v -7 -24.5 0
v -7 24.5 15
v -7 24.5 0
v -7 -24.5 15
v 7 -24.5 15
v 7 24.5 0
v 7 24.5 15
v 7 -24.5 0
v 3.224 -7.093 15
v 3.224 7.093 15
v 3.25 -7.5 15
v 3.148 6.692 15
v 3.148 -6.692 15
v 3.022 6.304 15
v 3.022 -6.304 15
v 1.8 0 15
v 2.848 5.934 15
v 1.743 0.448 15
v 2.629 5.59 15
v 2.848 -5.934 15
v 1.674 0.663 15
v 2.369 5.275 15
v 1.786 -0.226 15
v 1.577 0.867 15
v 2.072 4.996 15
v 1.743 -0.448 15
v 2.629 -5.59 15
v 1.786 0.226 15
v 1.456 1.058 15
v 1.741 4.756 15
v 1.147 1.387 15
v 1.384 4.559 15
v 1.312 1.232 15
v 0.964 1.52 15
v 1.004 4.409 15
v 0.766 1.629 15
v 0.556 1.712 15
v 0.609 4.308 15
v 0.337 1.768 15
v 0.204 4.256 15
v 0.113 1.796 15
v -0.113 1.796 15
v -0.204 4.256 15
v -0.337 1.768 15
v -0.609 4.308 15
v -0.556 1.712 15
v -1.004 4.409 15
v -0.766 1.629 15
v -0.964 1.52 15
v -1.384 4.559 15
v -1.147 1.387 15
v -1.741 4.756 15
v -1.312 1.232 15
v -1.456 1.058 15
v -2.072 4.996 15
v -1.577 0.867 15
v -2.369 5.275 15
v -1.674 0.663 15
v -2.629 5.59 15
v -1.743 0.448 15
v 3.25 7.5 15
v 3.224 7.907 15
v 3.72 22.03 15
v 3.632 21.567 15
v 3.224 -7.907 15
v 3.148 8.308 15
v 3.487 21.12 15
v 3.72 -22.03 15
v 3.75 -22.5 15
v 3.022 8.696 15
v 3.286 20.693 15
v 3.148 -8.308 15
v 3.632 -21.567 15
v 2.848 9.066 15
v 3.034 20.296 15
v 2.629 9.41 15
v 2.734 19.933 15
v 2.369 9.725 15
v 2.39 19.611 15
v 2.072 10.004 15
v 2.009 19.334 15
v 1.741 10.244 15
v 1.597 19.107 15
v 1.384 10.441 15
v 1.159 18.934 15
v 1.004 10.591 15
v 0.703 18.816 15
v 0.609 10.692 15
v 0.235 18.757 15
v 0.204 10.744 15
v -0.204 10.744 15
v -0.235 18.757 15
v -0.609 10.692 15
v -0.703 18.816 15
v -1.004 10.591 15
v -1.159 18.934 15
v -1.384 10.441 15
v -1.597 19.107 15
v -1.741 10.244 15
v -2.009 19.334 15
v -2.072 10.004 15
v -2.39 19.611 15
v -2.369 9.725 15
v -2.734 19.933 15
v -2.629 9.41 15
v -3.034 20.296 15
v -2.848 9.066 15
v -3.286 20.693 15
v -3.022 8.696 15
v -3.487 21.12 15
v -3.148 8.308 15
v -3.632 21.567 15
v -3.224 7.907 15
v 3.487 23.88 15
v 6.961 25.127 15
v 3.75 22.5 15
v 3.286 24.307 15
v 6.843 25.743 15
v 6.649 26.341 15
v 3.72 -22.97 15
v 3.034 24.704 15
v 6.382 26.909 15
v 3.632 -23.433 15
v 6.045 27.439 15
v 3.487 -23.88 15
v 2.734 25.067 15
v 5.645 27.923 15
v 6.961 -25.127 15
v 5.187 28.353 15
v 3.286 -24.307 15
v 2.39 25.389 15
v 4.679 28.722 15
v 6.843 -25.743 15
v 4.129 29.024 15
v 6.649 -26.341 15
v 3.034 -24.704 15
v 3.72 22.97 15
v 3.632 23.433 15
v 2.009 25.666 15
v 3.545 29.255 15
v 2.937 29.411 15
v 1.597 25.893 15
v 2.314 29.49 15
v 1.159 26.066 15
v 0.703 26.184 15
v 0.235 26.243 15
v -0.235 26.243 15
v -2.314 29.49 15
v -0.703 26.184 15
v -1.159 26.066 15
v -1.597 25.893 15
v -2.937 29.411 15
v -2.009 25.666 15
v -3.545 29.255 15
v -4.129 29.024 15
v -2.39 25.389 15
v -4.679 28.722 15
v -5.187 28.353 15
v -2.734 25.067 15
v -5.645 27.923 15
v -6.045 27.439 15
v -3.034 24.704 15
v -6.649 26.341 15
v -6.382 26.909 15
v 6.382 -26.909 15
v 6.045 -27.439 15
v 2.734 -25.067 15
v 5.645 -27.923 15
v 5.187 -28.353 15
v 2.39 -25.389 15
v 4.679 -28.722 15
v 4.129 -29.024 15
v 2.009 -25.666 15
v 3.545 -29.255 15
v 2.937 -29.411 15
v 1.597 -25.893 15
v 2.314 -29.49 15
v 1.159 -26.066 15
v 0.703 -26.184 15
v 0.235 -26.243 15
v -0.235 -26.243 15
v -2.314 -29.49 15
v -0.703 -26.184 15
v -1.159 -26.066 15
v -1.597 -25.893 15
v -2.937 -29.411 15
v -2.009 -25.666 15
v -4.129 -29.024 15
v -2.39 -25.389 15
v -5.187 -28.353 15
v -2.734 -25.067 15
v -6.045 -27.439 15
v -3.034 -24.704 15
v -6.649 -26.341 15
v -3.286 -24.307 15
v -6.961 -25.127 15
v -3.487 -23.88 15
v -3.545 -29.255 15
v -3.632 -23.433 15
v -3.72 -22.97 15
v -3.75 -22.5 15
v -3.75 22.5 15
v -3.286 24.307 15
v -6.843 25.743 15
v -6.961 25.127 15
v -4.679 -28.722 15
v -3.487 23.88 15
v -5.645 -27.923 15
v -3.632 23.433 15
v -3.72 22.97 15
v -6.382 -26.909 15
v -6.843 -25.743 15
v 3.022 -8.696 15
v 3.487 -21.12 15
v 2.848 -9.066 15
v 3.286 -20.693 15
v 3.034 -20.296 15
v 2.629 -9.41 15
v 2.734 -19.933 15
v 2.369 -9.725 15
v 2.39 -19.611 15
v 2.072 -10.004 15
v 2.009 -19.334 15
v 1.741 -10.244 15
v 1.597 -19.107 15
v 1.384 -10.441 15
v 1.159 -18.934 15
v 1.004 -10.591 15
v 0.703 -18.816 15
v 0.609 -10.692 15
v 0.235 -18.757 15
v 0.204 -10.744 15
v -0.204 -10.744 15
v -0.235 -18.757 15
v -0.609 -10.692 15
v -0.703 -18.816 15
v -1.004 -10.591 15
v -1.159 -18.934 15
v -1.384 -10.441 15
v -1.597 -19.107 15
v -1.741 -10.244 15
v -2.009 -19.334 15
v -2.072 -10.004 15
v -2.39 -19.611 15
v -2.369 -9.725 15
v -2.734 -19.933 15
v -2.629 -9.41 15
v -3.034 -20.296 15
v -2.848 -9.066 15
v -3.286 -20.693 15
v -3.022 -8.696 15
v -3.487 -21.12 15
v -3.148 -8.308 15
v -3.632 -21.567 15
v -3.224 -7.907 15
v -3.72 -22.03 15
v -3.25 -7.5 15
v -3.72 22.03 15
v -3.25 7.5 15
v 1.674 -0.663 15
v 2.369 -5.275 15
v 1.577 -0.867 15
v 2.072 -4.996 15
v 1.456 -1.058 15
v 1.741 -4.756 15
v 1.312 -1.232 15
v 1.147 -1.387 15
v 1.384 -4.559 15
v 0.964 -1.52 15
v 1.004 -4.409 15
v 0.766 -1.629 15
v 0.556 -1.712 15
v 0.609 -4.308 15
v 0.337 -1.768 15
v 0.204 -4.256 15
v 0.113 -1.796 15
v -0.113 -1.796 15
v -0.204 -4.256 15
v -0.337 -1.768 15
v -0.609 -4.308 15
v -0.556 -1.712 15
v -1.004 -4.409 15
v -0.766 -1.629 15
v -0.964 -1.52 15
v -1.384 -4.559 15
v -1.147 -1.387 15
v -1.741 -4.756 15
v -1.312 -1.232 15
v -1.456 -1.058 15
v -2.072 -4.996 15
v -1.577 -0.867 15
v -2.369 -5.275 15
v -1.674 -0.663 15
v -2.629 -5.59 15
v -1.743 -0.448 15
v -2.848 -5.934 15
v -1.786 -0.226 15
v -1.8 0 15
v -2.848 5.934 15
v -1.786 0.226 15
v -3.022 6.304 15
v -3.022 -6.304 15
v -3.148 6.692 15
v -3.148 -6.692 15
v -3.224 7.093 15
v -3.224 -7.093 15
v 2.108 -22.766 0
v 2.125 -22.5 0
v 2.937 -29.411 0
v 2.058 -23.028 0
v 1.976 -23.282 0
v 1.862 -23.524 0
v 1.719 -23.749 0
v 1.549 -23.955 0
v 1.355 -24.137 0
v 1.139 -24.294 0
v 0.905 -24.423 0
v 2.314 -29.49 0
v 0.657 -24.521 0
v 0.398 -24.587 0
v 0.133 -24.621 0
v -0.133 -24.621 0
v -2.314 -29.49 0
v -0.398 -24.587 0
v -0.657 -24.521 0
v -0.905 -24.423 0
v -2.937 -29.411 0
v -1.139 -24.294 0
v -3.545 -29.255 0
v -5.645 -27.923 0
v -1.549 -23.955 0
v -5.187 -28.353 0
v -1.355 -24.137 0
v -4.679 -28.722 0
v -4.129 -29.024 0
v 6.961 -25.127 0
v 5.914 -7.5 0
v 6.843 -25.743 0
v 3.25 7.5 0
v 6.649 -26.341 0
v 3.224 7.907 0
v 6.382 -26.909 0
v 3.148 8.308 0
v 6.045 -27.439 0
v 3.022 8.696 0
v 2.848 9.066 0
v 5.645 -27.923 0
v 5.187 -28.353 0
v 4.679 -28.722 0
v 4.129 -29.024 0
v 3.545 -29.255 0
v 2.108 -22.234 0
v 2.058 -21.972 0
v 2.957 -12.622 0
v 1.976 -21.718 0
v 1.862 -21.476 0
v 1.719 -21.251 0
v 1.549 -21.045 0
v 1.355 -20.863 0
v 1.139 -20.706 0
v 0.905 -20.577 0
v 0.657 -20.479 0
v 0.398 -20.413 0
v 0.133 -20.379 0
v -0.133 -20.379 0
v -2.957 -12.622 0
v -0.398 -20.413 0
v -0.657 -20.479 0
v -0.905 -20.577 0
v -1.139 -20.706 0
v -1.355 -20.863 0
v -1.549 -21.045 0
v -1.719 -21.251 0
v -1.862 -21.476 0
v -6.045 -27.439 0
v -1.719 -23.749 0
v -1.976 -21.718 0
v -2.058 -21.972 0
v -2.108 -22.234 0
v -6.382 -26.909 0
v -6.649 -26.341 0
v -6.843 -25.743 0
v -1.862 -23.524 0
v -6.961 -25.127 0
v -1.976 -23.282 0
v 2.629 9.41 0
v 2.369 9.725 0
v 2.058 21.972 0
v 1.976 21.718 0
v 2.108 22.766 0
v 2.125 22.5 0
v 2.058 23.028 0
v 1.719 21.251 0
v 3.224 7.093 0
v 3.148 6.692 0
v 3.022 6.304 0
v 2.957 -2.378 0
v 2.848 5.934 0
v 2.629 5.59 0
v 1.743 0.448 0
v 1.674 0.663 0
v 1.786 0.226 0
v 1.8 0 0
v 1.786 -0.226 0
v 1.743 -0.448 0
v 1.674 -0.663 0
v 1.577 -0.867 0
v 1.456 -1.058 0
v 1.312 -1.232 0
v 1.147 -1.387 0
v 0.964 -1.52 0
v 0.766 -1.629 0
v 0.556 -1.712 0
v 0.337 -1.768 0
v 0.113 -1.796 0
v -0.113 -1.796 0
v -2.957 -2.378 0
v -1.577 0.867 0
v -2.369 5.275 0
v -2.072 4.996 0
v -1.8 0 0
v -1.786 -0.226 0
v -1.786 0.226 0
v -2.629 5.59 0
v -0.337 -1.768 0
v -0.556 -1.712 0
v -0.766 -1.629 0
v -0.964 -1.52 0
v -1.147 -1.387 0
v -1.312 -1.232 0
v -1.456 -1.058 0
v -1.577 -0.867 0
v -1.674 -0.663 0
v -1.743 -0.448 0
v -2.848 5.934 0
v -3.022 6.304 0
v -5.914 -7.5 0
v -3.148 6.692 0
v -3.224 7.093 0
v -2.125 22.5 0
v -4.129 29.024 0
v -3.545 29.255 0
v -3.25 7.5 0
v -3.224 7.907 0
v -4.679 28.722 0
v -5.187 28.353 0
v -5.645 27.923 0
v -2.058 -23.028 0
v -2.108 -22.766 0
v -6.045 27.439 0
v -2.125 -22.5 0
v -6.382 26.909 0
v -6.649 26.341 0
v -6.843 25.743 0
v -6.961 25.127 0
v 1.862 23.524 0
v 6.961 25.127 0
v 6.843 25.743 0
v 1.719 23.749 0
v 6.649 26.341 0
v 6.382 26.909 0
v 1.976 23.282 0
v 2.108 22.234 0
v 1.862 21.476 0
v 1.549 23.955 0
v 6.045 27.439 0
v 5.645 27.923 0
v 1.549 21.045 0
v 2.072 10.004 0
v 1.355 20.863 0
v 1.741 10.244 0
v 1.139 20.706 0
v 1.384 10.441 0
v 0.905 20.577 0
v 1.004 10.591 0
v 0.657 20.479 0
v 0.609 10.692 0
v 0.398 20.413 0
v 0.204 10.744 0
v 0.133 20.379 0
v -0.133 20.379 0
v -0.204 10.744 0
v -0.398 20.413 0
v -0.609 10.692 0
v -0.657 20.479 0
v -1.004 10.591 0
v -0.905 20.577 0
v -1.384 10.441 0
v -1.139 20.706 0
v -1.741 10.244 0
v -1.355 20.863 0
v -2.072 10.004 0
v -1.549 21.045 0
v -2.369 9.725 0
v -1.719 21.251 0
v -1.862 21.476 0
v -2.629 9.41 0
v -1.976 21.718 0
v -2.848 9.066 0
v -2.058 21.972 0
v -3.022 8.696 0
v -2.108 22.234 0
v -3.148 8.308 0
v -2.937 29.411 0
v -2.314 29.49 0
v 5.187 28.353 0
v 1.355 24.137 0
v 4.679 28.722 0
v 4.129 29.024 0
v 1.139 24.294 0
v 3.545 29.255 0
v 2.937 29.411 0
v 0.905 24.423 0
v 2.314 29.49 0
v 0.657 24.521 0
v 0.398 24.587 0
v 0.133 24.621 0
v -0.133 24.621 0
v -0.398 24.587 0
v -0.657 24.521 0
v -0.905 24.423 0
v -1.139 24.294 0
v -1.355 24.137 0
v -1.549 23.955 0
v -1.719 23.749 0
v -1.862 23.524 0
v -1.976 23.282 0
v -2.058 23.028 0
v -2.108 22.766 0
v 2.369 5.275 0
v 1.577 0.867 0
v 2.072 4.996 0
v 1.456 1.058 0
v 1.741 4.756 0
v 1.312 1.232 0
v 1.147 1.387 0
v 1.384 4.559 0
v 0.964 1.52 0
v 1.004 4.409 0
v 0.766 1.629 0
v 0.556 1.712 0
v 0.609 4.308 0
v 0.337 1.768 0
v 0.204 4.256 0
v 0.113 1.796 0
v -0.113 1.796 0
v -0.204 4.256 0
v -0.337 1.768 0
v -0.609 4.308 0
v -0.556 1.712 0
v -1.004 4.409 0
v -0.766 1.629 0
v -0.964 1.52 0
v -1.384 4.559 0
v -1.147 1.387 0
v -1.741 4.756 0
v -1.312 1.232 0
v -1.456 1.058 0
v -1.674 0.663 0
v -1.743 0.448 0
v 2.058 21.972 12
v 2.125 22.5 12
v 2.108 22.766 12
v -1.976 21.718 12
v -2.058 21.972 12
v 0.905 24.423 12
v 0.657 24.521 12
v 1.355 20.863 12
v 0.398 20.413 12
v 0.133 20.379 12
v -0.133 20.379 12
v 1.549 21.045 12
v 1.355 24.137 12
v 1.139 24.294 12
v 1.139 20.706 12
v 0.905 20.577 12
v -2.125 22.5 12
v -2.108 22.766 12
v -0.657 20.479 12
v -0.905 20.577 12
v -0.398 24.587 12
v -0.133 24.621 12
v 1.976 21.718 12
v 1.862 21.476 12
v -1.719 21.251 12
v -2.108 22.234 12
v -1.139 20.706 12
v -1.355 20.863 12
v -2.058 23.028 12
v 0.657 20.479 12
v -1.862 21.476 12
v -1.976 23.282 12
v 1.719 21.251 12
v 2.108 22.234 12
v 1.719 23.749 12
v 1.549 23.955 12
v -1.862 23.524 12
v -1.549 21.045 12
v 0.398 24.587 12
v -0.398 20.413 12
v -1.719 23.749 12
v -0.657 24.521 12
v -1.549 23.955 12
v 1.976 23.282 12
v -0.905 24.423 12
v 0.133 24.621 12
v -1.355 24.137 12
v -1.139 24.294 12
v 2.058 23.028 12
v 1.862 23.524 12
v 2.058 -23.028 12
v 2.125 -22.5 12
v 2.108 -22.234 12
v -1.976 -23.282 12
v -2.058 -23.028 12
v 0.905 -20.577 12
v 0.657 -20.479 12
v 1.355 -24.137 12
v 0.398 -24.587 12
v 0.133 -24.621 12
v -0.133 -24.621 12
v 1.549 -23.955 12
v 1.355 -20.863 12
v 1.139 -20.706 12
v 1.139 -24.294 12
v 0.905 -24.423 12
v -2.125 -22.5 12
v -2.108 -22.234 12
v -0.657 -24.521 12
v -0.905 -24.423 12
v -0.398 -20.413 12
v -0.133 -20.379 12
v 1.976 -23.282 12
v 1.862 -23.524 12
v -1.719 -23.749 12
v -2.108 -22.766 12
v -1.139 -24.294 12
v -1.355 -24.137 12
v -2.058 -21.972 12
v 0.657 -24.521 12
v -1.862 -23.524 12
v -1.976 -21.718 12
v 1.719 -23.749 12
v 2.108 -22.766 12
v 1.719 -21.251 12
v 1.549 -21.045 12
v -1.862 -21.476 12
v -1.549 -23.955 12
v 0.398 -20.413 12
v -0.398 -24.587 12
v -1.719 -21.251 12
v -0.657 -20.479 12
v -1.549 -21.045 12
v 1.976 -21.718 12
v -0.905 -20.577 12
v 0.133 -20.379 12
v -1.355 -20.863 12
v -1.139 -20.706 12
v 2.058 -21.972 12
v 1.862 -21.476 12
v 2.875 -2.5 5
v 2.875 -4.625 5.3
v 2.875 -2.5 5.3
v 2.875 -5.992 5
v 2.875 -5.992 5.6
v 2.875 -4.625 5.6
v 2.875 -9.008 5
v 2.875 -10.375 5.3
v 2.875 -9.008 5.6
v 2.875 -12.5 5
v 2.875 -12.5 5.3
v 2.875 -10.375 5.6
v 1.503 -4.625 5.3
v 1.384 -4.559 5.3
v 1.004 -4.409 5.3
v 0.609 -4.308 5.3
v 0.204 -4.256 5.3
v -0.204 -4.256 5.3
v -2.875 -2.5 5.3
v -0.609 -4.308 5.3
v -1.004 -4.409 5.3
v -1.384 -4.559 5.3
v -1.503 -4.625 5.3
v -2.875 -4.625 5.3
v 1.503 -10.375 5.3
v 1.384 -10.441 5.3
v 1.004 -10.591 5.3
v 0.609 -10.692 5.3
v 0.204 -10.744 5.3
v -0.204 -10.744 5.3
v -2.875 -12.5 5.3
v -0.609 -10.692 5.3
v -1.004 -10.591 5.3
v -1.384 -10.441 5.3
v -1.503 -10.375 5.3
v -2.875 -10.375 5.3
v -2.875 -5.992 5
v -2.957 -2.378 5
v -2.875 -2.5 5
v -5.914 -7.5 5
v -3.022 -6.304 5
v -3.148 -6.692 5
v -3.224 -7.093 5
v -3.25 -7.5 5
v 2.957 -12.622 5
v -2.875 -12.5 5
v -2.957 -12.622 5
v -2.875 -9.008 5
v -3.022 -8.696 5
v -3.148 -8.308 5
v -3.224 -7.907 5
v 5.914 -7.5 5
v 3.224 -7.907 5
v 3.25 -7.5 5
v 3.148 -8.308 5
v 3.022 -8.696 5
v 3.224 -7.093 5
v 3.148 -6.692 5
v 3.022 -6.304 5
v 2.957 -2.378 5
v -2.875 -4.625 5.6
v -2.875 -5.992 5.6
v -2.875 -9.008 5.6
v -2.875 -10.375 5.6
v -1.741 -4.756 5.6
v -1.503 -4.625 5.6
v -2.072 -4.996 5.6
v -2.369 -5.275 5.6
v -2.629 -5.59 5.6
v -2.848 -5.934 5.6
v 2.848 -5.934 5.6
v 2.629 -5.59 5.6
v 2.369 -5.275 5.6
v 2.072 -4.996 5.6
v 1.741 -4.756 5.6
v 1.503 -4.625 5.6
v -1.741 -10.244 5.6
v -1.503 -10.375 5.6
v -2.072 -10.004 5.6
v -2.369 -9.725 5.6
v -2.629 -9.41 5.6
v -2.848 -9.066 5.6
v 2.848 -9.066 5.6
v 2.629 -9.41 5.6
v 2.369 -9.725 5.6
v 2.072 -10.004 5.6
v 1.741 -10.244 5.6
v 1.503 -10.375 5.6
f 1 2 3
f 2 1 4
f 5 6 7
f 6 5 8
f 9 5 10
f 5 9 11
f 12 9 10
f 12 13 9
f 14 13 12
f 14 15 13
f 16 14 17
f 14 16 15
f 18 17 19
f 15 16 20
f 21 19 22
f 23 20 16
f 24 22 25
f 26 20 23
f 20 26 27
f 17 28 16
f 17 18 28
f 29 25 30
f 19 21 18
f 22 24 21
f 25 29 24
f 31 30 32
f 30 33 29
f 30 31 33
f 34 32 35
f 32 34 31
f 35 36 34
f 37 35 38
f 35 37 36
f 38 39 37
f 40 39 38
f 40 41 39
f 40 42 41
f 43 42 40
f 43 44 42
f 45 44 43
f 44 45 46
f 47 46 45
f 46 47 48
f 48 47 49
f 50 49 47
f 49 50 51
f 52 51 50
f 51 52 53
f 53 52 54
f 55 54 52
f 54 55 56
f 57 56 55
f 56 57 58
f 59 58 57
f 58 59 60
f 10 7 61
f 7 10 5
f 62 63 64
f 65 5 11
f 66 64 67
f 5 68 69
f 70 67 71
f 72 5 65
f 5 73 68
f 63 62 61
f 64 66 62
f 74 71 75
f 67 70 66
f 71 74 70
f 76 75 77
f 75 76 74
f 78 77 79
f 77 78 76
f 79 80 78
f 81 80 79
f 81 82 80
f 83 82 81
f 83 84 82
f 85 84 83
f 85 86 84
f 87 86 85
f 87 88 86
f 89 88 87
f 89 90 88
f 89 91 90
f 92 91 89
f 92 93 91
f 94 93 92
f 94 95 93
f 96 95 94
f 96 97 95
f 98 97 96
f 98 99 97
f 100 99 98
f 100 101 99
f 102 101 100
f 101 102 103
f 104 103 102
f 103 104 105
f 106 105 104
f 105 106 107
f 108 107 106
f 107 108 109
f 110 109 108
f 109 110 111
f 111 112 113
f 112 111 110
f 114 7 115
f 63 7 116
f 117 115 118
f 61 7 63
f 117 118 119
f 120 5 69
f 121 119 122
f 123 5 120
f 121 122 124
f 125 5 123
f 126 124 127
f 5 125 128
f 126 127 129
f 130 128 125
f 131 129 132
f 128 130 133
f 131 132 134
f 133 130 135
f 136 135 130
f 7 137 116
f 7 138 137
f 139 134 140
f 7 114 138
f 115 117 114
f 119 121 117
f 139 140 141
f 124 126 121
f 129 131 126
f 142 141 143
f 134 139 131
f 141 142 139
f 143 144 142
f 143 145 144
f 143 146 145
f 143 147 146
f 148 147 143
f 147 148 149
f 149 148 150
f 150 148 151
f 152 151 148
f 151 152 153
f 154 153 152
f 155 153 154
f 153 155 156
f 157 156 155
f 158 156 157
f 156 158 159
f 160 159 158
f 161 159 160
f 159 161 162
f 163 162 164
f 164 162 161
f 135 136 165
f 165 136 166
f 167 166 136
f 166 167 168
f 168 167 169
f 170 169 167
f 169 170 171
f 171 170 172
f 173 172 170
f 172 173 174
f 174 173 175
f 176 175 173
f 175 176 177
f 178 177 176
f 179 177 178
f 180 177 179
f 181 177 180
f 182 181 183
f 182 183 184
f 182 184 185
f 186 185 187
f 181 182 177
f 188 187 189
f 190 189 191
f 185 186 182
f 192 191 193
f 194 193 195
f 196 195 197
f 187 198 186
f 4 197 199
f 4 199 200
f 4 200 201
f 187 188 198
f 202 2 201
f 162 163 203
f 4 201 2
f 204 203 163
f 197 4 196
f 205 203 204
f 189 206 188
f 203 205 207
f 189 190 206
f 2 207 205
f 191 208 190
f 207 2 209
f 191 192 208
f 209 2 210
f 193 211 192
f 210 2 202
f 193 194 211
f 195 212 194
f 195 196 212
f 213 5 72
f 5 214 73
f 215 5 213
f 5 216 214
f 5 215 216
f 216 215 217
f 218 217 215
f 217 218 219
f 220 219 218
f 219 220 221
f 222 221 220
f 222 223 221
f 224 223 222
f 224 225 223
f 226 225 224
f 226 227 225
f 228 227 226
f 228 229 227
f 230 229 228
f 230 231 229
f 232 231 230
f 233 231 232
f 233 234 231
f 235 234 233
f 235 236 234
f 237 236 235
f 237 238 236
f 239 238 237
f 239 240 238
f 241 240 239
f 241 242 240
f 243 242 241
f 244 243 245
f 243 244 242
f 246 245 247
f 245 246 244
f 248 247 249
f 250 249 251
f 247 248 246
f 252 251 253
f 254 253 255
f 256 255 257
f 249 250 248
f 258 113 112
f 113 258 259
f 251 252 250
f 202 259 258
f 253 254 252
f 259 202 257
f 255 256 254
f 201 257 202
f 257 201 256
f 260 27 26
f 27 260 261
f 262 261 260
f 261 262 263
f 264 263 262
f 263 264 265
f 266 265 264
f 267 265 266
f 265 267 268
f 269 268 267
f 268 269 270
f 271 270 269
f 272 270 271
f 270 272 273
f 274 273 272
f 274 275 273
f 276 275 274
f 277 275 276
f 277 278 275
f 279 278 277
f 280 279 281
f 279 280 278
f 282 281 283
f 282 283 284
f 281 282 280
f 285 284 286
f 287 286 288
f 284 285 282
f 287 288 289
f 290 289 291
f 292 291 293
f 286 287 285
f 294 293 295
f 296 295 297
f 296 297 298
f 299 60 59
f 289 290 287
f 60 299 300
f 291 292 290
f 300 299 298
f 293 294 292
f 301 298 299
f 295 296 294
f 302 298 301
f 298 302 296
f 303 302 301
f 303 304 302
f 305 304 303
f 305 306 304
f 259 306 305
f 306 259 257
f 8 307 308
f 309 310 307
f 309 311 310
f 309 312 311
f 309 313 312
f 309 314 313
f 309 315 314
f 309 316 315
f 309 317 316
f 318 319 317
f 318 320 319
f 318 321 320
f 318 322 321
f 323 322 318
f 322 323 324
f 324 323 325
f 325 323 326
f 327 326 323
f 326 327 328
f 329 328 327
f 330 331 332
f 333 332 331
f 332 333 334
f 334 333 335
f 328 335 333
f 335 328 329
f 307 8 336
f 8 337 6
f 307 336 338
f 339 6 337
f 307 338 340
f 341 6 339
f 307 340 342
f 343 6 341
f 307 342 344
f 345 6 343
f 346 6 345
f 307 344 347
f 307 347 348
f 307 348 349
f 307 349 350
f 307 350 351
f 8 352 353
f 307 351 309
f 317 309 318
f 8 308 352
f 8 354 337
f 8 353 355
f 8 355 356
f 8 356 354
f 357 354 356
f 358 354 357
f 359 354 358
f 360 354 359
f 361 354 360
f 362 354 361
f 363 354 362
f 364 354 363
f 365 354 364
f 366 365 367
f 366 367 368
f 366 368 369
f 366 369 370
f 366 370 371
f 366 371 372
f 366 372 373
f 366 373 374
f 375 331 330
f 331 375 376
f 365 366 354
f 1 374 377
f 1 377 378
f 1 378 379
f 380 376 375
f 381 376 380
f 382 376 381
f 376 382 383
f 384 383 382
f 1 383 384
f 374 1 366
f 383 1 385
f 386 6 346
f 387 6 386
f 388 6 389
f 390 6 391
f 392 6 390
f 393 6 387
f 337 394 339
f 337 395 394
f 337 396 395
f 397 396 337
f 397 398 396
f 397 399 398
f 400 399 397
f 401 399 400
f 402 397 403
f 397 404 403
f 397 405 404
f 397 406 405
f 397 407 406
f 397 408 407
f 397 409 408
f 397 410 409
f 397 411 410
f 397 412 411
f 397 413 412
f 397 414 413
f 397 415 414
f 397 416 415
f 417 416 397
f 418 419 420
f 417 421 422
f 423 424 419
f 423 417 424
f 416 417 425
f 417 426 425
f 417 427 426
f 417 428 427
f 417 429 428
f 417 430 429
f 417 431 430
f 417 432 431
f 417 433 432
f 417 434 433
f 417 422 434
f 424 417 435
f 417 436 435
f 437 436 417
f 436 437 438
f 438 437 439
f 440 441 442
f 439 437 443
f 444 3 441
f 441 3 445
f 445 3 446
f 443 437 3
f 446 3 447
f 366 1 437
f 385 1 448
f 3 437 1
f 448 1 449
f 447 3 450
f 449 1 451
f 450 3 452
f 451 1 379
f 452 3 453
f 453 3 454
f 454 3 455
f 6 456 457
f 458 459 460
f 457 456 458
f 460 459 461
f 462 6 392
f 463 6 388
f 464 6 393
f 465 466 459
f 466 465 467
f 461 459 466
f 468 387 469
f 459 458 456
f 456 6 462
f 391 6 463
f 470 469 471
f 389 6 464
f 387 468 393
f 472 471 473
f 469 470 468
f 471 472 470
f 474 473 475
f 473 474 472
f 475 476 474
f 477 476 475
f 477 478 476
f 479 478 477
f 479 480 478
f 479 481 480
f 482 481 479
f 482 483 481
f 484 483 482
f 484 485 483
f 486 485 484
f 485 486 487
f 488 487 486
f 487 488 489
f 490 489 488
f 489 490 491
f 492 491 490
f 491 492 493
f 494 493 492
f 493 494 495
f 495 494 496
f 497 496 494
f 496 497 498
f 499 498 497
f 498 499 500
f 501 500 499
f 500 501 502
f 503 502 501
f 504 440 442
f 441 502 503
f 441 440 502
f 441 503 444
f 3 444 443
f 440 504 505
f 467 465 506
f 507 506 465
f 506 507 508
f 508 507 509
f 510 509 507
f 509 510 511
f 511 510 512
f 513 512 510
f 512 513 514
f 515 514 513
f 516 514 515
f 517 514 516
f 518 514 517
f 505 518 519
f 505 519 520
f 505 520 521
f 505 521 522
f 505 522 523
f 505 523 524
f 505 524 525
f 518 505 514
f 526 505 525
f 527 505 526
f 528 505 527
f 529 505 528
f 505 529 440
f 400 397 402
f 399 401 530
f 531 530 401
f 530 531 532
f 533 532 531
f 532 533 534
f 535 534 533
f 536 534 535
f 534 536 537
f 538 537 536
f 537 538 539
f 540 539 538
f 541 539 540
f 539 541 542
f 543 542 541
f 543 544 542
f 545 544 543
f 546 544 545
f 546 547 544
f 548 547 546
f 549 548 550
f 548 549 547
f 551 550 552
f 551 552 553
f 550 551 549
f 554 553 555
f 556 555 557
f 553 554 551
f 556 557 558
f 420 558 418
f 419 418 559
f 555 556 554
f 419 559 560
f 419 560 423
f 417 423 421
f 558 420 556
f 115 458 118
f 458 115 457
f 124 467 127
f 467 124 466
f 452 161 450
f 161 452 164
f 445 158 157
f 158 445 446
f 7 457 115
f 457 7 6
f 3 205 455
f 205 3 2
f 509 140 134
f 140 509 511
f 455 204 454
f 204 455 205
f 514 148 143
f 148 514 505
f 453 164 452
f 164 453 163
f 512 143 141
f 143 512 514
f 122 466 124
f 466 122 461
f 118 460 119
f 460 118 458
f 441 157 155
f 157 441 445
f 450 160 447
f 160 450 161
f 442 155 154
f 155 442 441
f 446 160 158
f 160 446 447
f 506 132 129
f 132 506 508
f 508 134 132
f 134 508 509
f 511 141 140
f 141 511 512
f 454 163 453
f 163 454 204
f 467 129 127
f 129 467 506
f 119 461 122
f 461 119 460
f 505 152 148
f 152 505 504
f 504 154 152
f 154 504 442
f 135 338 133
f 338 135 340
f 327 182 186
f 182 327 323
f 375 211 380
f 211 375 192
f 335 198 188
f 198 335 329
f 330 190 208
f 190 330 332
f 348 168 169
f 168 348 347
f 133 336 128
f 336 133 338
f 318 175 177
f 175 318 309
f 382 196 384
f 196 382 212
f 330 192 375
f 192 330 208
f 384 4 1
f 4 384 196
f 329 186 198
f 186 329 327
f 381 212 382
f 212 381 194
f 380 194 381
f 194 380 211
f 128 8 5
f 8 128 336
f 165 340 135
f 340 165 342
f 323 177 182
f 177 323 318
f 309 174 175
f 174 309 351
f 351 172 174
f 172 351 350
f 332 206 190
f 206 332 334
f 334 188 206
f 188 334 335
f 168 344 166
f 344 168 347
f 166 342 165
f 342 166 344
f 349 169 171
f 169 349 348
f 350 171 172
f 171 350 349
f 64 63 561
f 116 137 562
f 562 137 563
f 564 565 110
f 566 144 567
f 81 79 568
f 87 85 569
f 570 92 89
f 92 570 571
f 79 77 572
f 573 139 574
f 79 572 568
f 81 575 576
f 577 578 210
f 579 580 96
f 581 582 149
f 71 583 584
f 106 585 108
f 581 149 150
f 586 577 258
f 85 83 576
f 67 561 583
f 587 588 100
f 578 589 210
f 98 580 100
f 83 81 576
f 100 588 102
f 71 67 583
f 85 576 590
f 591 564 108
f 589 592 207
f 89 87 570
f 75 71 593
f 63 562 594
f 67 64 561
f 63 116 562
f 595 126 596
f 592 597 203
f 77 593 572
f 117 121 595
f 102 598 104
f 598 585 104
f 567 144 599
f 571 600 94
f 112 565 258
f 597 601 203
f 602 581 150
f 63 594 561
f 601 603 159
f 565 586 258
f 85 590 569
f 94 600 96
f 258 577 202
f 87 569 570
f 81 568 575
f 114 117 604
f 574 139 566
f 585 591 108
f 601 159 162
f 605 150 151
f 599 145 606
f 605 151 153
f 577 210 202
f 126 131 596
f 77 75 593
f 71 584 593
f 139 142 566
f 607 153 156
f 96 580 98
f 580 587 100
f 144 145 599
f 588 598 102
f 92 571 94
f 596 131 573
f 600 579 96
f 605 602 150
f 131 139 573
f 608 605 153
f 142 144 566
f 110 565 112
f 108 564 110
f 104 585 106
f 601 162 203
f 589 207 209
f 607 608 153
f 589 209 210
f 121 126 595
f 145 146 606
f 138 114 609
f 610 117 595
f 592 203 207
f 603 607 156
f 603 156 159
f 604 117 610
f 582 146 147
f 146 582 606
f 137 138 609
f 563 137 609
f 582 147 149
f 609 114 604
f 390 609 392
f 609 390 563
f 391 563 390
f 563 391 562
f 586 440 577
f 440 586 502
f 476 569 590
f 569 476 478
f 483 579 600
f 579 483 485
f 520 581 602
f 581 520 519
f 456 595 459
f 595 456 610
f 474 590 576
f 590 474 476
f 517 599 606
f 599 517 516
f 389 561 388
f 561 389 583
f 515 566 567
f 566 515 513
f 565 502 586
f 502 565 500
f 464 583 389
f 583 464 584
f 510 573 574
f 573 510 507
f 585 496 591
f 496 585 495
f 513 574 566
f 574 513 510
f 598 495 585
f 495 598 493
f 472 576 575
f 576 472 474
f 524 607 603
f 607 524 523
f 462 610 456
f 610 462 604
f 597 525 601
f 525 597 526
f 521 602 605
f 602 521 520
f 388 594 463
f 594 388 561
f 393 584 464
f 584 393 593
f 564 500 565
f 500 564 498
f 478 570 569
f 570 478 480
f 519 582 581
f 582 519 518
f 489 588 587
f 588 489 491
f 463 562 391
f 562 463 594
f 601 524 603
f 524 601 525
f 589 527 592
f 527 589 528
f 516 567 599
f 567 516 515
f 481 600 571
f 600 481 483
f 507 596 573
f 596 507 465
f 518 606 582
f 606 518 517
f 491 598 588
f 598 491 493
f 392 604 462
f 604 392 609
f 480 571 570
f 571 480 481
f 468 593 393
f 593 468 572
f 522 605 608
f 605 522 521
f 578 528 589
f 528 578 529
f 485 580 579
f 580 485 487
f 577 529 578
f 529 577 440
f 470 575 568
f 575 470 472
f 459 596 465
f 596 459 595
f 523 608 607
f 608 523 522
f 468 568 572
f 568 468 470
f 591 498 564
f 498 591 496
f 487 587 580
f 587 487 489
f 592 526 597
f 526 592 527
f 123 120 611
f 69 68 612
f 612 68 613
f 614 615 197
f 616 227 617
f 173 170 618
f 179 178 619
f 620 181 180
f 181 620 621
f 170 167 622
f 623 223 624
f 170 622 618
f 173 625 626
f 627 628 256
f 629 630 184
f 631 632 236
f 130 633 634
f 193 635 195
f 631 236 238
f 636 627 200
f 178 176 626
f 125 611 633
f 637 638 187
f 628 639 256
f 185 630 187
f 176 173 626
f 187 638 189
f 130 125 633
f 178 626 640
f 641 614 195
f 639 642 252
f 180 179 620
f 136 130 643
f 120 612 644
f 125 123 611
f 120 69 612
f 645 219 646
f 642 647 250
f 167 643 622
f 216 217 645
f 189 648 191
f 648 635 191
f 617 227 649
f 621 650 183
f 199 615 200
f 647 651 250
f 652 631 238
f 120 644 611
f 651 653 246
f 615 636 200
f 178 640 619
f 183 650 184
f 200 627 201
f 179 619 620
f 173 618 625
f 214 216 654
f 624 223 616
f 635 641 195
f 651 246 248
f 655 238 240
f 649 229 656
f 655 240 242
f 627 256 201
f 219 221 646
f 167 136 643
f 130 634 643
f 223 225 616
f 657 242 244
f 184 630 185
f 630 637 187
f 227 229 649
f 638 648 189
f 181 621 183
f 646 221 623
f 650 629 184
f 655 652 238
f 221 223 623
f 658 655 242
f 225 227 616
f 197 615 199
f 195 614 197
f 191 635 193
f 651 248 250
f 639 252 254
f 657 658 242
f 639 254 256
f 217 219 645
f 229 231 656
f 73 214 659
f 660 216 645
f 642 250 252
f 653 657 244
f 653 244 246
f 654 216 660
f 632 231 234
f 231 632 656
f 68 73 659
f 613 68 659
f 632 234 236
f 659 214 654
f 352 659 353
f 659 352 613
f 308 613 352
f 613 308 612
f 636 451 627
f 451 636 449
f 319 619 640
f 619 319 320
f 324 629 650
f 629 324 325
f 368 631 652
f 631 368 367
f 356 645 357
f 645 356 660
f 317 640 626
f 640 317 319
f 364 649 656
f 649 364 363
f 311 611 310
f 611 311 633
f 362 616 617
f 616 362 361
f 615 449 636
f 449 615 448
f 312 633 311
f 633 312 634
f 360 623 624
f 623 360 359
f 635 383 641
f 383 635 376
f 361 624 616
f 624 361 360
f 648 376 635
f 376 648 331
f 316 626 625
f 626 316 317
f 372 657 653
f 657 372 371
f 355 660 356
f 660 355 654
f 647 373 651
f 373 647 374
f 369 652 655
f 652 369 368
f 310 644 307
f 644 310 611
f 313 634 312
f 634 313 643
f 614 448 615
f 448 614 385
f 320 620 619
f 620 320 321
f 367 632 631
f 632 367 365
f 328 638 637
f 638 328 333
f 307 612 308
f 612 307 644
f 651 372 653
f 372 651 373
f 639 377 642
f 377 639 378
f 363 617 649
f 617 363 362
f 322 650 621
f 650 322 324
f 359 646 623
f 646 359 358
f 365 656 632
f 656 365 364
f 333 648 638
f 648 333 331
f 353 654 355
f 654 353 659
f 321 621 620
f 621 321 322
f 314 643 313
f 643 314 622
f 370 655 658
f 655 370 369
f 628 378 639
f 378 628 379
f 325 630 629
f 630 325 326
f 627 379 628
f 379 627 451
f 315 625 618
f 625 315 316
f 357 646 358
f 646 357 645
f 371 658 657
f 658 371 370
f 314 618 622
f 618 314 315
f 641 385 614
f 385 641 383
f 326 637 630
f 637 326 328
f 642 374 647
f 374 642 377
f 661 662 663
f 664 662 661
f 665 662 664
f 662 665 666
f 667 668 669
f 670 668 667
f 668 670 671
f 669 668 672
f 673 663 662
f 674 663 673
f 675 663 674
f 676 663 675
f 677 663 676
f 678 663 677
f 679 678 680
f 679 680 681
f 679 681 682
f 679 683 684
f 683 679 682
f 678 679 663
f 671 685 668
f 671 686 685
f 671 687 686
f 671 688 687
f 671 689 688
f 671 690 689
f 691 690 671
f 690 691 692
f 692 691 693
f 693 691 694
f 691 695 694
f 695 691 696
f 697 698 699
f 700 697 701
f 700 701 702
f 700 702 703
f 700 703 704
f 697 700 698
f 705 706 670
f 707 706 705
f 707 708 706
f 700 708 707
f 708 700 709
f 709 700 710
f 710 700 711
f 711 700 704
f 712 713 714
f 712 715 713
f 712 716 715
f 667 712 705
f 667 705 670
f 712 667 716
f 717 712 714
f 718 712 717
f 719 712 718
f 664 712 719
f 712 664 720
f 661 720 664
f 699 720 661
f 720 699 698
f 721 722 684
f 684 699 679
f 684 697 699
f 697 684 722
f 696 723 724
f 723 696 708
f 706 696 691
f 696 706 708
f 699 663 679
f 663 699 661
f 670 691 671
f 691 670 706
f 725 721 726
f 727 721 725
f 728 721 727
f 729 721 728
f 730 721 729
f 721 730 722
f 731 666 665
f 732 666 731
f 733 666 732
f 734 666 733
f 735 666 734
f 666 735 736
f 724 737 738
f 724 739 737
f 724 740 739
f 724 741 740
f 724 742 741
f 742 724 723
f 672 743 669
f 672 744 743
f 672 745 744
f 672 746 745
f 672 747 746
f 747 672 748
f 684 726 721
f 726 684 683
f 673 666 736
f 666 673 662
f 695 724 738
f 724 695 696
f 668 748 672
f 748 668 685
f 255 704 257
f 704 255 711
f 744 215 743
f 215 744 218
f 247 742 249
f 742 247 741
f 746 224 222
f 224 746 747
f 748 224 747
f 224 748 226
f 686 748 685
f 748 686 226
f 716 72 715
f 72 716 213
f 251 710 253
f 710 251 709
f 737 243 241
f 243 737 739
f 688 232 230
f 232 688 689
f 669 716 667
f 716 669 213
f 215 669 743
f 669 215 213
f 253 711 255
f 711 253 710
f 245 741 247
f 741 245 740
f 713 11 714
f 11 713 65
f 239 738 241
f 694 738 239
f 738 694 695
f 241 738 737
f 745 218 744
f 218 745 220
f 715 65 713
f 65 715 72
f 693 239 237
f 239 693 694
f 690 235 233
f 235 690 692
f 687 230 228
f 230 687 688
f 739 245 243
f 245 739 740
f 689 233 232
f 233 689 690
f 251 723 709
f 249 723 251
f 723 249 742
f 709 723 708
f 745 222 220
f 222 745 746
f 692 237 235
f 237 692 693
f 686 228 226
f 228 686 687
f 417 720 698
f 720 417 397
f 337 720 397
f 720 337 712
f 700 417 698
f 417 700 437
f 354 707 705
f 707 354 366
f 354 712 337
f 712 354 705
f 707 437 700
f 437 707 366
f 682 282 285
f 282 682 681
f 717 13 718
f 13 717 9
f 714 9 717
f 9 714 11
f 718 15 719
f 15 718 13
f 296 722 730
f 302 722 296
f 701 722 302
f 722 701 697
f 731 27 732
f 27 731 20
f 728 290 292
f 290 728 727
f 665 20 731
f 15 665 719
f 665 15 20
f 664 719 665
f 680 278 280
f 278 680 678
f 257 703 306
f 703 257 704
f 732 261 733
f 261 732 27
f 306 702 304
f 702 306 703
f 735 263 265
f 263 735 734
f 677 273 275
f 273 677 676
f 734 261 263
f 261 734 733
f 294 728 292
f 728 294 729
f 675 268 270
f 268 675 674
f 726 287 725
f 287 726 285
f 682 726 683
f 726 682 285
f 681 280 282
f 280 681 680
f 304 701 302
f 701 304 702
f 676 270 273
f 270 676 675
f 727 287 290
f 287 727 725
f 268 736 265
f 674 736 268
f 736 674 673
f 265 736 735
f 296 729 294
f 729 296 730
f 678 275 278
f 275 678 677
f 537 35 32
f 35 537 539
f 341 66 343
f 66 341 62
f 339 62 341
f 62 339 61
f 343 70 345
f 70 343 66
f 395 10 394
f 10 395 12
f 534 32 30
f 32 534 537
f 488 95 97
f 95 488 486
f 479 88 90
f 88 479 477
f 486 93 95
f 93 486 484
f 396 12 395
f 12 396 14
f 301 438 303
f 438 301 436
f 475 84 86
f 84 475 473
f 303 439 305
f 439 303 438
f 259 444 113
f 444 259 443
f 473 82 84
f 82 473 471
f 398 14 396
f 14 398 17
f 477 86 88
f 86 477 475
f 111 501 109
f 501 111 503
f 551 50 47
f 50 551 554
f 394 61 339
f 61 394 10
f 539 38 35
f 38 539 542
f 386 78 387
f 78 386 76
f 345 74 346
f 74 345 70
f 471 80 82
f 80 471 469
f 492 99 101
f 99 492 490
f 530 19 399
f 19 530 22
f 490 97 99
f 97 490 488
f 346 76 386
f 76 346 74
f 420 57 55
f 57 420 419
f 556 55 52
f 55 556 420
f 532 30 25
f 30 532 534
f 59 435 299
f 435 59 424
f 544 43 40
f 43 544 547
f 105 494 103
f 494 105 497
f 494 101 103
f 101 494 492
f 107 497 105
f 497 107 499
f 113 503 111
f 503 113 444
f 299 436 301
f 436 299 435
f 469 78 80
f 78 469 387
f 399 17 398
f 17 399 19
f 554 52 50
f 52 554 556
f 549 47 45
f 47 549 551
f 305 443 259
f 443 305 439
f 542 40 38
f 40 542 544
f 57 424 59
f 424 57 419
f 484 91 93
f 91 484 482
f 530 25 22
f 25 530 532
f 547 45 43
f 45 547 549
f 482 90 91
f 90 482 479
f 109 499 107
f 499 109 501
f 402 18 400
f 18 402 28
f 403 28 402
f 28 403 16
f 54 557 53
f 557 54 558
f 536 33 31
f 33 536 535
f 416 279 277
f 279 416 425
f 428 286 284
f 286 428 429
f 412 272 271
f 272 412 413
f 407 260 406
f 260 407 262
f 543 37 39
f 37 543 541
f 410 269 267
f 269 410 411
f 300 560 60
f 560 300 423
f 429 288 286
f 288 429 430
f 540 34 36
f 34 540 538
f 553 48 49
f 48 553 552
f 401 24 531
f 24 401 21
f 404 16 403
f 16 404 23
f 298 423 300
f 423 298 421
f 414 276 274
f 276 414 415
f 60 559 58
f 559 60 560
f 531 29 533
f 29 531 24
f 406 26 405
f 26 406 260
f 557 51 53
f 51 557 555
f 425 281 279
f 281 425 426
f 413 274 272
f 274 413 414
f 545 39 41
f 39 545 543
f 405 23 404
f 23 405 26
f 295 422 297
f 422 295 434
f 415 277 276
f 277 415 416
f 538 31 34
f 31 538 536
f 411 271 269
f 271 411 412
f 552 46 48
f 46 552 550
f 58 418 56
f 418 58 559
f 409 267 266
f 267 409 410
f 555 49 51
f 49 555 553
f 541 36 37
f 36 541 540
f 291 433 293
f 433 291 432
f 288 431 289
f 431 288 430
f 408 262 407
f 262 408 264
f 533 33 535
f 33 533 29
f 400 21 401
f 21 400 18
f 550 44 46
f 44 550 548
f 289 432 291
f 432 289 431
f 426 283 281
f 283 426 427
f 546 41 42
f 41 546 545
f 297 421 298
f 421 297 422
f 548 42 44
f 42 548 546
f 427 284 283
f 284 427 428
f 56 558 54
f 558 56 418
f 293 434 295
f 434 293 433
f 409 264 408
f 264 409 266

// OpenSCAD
$fn = 50;


difference() {
	union() {
		hull() {
			translate(v = [-2.0000000000, 9.5000000000, 0]) {
				cylinder(h = 15, r = 5);
			}
			translate(v = [2.0000000000, 9.5000000000, 0]) {
				cylinder(h = 15, r = 5);
			}
			translate(v = [-2.0000000000, -9.5000000000, 0]) {
				cylinder(h = 15, r = 5);
			}
			translate(v = [2.0000000000, -9.5000000000, 0]) {
				cylinder(h = 15, r = 5);
			}
		}
		translate(v = [0.0000000000, 15.0000000000, 0]) {
			hull() {
				translate(v = [-2.0000000000, 9.5000000000, 0]) {
					cylinder(h = 15, r = 5);
				}
				translate(v = [2.0000000000, 9.5000000000, 0]) {
					cylinder(h = 15, r = 5);
				}
				translate(v = [-2.0000000000, -9.5000000000, 0]) {
					cylinder(h = 15, r = 5);
				}
				translate(v = [2.0000000000, -9.5000000000, 0]) {
					cylinder(h = 15, r = 5);
				}
			}
		}
		translate(v = [0.0000000000, 15.0000000000, 0]) {
			hull() {
				translate(v = [-2.0000000000, 9.5000000000, 0]) {
					cylinder(h = 15, r = 5);
				}
				translate(v = [2.0000000000, 9.5000000000, 0]) {
					cylinder(h = 15, r = 5);
				}
				translate(v = [-2.0000000000, -9.5000000000, 0]) {
					cylinder(h = 15, r = 5);
				}
				translate(v = [2.0000000000, -9.5000000000, 0]) {
					cylinder(h = 15, r = 5);
				}
			}
		}
		translate(v = [0.0000000000, -15.0000000000, 0]) {
			hull() {
				translate(v = [-2.0000000000, 9.5000000000, 0]) {
					cylinder(h = 15, r = 5);
				}
				translate(v = [2.0000000000, 9.5000000000, 0]) {
					cylinder(h = 15, r = 5);
				}
				translate(v = [-2.0000000000, -9.5000000000, 0]) {
					cylinder(h = 15, r = 5);
				}
				translate(v = [2.0000000000, -9.5000000000, 0]) {
					cylinder(h = 15, r = 5);
				}
			}
		}
		translate(v = [0.0000000000, -15.0000000000, 0]) {
			hull() {
				translate(v = [-2.0000000000, 9.5000000000, 0]) {
					cylinder(h = 15, r = 5);
				}
				translate(v = [2.0000000000, 9.5000000000, 0]) {
					cylinder(h = 15, r = 5);
				}
				translate(v = [-2.0000000000, -9.5000000000, 0]) {
					cylinder(h = 15, r = 5);
				}
				translate(v = [2.0000000000, -9.5000000000, 0]) {
					cylinder(h = 15, r = 5);
				}
			}
		}
	}
	union() {
		translate(v = [0.0000000000, 22.5000000000, 15]) {
			rotate(a = [0, 0, 0]) {
				difference() {
					union() {
						#translate(v = [0, 0, -15.0000000000]) {
							cylinder(h = 15, r = 2.0000000000);
						}
						#translate(v = [0, 0, -3]) {
							cylinder(h = 3, r1 = 2.1250000000, r2 = 3.7500000000);
						}
						#translate(v = [0, 0, -15.0000000000]) {
							cylinder(h = 15, r = 2.1250000000);
						}
						#translate(v = [0, 0, -15.0000000000]) {
							cylinder(h = 15, r = 2.0000000000);
						}
					}
					union();
				}
			}
		}
		translate(v = [0.0000000000, 22.5000000000, 15]) {
			rotate(a = [0, 0, 0]) {
				difference() {
					union() {
						#translate(v = [0, 0, -15.0000000000]) {
							cylinder(h = 15, r = 2.0000000000);
						}
						#translate(v = [0, 0, -3]) {
							cylinder(h = 3, r1 = 2.1250000000, r2 = 3.7500000000);
						}
						#translate(v = [0, 0, -15.0000000000]) {
							cylinder(h = 15, r = 2.1250000000);
						}
						#translate(v = [0, 0, -15.0000000000]) {
							cylinder(h = 15, r = 2.0000000000);
						}
					}
					union();
				}
			}
		}
		translate(v = [0.0000000000, -22.5000000000, 15]) {
			rotate(a = [0, 0, 0]) {
				difference() {
					union() {
						#translate(v = [0, 0, -15.0000000000]) {
							cylinder(h = 15, r = 2.0000000000);
						}
						#translate(v = [0, 0, -3]) {
							cylinder(h = 3, r1 = 2.1250000000, r2 = 3.7500000000);
						}
						#translate(v = [0, 0, -15.0000000000]) {
							cylinder(h = 15, r = 2.1250000000);
						}
						#translate(v = [0, 0, -15.0000000000]) {
							cylinder(h = 15, r = 2.0000000000);
						}
					}
					union();
				}
			}
		}
		translate(v = [0.0000000000, -22.5000000000, 15]) {
			rotate(a = [0, 0, 0]) {
				difference() {
					union() {
						#translate(v = [0, 0, -15.0000000000]) {
							cylinder(h = 15, r = 2.0000000000);
						}
						#translate(v = [0, 0, -3]) {
							cylinder(h = 3, r1 = 2.1250000000, r2 = 3.7500000000);
						}
						#translate(v = [0, 0, -15.0000000000]) {
							cylinder(h = 15, r = 2.1250000000);
						}
						#translate(v = [0, 0, -15.0000000000]) {
							cylinder(h = 15, r = 2.0000000000);
						}
					}
					union();
				}
			}
		}
		translate(v = [0.0000000000, -7.5000000000, 0]) {
			rotate(a = [0, 0, 0]) {
				difference() {
					union() {
						#translate(v = [-2.8750000000, -5.0000000000, -0.3000000000]) {
							cube(size = [5.7500000000, 10, 0.3000000000]);
						}
						#translate(v = [-2.8750000000, -2.8750000000, -0.6000000000]) {
							cube(size = [5.7500000000, 5.7500000000, 0.3000000000]);
						}
						#translate(v = [-2.8750000000, -5.0000000000, 5]) {
							cube(size = [5.7500000000, 10, 0.3000000000]);
						}
						#translate(v = [-2.8750000000, -2.8750000000, 5.3000000000]) {
							cube(size = [5.7500000000, 5.7500000000, 0.3000000000]);
						}
						#translate(v = [0, 0, -100.0000000000]) {
							cylinder(h = 200, r = 3.2500000000);
						}
						#linear_extrude(height = 5) {
							polygon(points = [[5.9142500000, 0.0000000000], [2.9571250000, 5.1218907443], [-2.9571250000, 5.1218907443], [-5.9142500000, 0.0000000000], [-2.9571250000, -5.1218907443], [2.9571250000, -5.1218907443]]);
						}
						#translate(v = [-2.8750000000, -5.0000000000, -0.3000000000]) {
							cube(size = [5.7500000000, 10, 0.3000000000]);
						}
						#translate(v = [-2.8750000000, -2.8750000000, -0.6000000000]) {
							cube(size = [5.7500000000, 5.7500000000, 0.3000000000]);
						}
						#translate(v = [-2.8750000000, -5.0000000000, 5]) {
							cube(size = [5.7500000000, 10, 0.3000000000]);
						}
						#translate(v = [-2.8750000000, -2.8750000000, 5.3000000000]) {
							cube(size = [5.7500000000, 5.7500000000, 0.3000000000]);
						}
						#translate(v = [0, 0, -100.0000000000]) {
							cylinder(h = 200, r = 3.2500000000);
						}
						#translate(v = [-2.8750000000, -5.0000000000, -0.3000000000]) {
							cube(size = [5.7500000000, 10, 0.3000000000]);
						}
						#translate(v = [-2.8750000000, -2.8750000000, -0.6000000000]) {
							cube(size = [5.7500000000, 5.7500000000, 0.3000000000]);
						}
						#translate(v = [-2.8750000000, -5.0000000000, 5]) {
							cube(size = [5.7500000000, 10, 0.3000000000]);
						}
						#translate(v = [-2.8750000000, -2.8750000000, 5.3000000000]) {
							cube(size = [5.7500000000, 5.7500000000, 0.3000000000]);
						}
						#translate(v = [0, 0, -100.0000000000]) {
							cylinder(h = 200, r = 3.2500000000);
						}
					}
					union();
				}
			}
		}
		translate(v = [0.0000000000, -7.5000000000, 0]) {
			translate(v = [0, 0, -100]) {
				cylinder(h = 200, r = 3.2500000000);
			}
		}
		translate(v = [0.0000000000, 7.5000000000, 0]) {
			translate(v = [0, 0, -100]) {
				cylinder(h = 200, r = 3.2500000000);
			}
		}
		translate(v = [0.0000000000, -7.5000000000, 0]) {
			translate(v = [0, 0, -100]) {
				cylinder(h = 200, r = 1.8000000000);
			}
		}
		translate(v = [0, 0, -100]) {
			cylinder(h = 200, r = 1.8000000000);
		}
		translate(v = [0.0000000000, 7.5000000000, 0]) {
			translate(v = [0, 0, -100]) {
				cylinder(h = 200, r = 1.8000000000);
			}
		}
	}
}
